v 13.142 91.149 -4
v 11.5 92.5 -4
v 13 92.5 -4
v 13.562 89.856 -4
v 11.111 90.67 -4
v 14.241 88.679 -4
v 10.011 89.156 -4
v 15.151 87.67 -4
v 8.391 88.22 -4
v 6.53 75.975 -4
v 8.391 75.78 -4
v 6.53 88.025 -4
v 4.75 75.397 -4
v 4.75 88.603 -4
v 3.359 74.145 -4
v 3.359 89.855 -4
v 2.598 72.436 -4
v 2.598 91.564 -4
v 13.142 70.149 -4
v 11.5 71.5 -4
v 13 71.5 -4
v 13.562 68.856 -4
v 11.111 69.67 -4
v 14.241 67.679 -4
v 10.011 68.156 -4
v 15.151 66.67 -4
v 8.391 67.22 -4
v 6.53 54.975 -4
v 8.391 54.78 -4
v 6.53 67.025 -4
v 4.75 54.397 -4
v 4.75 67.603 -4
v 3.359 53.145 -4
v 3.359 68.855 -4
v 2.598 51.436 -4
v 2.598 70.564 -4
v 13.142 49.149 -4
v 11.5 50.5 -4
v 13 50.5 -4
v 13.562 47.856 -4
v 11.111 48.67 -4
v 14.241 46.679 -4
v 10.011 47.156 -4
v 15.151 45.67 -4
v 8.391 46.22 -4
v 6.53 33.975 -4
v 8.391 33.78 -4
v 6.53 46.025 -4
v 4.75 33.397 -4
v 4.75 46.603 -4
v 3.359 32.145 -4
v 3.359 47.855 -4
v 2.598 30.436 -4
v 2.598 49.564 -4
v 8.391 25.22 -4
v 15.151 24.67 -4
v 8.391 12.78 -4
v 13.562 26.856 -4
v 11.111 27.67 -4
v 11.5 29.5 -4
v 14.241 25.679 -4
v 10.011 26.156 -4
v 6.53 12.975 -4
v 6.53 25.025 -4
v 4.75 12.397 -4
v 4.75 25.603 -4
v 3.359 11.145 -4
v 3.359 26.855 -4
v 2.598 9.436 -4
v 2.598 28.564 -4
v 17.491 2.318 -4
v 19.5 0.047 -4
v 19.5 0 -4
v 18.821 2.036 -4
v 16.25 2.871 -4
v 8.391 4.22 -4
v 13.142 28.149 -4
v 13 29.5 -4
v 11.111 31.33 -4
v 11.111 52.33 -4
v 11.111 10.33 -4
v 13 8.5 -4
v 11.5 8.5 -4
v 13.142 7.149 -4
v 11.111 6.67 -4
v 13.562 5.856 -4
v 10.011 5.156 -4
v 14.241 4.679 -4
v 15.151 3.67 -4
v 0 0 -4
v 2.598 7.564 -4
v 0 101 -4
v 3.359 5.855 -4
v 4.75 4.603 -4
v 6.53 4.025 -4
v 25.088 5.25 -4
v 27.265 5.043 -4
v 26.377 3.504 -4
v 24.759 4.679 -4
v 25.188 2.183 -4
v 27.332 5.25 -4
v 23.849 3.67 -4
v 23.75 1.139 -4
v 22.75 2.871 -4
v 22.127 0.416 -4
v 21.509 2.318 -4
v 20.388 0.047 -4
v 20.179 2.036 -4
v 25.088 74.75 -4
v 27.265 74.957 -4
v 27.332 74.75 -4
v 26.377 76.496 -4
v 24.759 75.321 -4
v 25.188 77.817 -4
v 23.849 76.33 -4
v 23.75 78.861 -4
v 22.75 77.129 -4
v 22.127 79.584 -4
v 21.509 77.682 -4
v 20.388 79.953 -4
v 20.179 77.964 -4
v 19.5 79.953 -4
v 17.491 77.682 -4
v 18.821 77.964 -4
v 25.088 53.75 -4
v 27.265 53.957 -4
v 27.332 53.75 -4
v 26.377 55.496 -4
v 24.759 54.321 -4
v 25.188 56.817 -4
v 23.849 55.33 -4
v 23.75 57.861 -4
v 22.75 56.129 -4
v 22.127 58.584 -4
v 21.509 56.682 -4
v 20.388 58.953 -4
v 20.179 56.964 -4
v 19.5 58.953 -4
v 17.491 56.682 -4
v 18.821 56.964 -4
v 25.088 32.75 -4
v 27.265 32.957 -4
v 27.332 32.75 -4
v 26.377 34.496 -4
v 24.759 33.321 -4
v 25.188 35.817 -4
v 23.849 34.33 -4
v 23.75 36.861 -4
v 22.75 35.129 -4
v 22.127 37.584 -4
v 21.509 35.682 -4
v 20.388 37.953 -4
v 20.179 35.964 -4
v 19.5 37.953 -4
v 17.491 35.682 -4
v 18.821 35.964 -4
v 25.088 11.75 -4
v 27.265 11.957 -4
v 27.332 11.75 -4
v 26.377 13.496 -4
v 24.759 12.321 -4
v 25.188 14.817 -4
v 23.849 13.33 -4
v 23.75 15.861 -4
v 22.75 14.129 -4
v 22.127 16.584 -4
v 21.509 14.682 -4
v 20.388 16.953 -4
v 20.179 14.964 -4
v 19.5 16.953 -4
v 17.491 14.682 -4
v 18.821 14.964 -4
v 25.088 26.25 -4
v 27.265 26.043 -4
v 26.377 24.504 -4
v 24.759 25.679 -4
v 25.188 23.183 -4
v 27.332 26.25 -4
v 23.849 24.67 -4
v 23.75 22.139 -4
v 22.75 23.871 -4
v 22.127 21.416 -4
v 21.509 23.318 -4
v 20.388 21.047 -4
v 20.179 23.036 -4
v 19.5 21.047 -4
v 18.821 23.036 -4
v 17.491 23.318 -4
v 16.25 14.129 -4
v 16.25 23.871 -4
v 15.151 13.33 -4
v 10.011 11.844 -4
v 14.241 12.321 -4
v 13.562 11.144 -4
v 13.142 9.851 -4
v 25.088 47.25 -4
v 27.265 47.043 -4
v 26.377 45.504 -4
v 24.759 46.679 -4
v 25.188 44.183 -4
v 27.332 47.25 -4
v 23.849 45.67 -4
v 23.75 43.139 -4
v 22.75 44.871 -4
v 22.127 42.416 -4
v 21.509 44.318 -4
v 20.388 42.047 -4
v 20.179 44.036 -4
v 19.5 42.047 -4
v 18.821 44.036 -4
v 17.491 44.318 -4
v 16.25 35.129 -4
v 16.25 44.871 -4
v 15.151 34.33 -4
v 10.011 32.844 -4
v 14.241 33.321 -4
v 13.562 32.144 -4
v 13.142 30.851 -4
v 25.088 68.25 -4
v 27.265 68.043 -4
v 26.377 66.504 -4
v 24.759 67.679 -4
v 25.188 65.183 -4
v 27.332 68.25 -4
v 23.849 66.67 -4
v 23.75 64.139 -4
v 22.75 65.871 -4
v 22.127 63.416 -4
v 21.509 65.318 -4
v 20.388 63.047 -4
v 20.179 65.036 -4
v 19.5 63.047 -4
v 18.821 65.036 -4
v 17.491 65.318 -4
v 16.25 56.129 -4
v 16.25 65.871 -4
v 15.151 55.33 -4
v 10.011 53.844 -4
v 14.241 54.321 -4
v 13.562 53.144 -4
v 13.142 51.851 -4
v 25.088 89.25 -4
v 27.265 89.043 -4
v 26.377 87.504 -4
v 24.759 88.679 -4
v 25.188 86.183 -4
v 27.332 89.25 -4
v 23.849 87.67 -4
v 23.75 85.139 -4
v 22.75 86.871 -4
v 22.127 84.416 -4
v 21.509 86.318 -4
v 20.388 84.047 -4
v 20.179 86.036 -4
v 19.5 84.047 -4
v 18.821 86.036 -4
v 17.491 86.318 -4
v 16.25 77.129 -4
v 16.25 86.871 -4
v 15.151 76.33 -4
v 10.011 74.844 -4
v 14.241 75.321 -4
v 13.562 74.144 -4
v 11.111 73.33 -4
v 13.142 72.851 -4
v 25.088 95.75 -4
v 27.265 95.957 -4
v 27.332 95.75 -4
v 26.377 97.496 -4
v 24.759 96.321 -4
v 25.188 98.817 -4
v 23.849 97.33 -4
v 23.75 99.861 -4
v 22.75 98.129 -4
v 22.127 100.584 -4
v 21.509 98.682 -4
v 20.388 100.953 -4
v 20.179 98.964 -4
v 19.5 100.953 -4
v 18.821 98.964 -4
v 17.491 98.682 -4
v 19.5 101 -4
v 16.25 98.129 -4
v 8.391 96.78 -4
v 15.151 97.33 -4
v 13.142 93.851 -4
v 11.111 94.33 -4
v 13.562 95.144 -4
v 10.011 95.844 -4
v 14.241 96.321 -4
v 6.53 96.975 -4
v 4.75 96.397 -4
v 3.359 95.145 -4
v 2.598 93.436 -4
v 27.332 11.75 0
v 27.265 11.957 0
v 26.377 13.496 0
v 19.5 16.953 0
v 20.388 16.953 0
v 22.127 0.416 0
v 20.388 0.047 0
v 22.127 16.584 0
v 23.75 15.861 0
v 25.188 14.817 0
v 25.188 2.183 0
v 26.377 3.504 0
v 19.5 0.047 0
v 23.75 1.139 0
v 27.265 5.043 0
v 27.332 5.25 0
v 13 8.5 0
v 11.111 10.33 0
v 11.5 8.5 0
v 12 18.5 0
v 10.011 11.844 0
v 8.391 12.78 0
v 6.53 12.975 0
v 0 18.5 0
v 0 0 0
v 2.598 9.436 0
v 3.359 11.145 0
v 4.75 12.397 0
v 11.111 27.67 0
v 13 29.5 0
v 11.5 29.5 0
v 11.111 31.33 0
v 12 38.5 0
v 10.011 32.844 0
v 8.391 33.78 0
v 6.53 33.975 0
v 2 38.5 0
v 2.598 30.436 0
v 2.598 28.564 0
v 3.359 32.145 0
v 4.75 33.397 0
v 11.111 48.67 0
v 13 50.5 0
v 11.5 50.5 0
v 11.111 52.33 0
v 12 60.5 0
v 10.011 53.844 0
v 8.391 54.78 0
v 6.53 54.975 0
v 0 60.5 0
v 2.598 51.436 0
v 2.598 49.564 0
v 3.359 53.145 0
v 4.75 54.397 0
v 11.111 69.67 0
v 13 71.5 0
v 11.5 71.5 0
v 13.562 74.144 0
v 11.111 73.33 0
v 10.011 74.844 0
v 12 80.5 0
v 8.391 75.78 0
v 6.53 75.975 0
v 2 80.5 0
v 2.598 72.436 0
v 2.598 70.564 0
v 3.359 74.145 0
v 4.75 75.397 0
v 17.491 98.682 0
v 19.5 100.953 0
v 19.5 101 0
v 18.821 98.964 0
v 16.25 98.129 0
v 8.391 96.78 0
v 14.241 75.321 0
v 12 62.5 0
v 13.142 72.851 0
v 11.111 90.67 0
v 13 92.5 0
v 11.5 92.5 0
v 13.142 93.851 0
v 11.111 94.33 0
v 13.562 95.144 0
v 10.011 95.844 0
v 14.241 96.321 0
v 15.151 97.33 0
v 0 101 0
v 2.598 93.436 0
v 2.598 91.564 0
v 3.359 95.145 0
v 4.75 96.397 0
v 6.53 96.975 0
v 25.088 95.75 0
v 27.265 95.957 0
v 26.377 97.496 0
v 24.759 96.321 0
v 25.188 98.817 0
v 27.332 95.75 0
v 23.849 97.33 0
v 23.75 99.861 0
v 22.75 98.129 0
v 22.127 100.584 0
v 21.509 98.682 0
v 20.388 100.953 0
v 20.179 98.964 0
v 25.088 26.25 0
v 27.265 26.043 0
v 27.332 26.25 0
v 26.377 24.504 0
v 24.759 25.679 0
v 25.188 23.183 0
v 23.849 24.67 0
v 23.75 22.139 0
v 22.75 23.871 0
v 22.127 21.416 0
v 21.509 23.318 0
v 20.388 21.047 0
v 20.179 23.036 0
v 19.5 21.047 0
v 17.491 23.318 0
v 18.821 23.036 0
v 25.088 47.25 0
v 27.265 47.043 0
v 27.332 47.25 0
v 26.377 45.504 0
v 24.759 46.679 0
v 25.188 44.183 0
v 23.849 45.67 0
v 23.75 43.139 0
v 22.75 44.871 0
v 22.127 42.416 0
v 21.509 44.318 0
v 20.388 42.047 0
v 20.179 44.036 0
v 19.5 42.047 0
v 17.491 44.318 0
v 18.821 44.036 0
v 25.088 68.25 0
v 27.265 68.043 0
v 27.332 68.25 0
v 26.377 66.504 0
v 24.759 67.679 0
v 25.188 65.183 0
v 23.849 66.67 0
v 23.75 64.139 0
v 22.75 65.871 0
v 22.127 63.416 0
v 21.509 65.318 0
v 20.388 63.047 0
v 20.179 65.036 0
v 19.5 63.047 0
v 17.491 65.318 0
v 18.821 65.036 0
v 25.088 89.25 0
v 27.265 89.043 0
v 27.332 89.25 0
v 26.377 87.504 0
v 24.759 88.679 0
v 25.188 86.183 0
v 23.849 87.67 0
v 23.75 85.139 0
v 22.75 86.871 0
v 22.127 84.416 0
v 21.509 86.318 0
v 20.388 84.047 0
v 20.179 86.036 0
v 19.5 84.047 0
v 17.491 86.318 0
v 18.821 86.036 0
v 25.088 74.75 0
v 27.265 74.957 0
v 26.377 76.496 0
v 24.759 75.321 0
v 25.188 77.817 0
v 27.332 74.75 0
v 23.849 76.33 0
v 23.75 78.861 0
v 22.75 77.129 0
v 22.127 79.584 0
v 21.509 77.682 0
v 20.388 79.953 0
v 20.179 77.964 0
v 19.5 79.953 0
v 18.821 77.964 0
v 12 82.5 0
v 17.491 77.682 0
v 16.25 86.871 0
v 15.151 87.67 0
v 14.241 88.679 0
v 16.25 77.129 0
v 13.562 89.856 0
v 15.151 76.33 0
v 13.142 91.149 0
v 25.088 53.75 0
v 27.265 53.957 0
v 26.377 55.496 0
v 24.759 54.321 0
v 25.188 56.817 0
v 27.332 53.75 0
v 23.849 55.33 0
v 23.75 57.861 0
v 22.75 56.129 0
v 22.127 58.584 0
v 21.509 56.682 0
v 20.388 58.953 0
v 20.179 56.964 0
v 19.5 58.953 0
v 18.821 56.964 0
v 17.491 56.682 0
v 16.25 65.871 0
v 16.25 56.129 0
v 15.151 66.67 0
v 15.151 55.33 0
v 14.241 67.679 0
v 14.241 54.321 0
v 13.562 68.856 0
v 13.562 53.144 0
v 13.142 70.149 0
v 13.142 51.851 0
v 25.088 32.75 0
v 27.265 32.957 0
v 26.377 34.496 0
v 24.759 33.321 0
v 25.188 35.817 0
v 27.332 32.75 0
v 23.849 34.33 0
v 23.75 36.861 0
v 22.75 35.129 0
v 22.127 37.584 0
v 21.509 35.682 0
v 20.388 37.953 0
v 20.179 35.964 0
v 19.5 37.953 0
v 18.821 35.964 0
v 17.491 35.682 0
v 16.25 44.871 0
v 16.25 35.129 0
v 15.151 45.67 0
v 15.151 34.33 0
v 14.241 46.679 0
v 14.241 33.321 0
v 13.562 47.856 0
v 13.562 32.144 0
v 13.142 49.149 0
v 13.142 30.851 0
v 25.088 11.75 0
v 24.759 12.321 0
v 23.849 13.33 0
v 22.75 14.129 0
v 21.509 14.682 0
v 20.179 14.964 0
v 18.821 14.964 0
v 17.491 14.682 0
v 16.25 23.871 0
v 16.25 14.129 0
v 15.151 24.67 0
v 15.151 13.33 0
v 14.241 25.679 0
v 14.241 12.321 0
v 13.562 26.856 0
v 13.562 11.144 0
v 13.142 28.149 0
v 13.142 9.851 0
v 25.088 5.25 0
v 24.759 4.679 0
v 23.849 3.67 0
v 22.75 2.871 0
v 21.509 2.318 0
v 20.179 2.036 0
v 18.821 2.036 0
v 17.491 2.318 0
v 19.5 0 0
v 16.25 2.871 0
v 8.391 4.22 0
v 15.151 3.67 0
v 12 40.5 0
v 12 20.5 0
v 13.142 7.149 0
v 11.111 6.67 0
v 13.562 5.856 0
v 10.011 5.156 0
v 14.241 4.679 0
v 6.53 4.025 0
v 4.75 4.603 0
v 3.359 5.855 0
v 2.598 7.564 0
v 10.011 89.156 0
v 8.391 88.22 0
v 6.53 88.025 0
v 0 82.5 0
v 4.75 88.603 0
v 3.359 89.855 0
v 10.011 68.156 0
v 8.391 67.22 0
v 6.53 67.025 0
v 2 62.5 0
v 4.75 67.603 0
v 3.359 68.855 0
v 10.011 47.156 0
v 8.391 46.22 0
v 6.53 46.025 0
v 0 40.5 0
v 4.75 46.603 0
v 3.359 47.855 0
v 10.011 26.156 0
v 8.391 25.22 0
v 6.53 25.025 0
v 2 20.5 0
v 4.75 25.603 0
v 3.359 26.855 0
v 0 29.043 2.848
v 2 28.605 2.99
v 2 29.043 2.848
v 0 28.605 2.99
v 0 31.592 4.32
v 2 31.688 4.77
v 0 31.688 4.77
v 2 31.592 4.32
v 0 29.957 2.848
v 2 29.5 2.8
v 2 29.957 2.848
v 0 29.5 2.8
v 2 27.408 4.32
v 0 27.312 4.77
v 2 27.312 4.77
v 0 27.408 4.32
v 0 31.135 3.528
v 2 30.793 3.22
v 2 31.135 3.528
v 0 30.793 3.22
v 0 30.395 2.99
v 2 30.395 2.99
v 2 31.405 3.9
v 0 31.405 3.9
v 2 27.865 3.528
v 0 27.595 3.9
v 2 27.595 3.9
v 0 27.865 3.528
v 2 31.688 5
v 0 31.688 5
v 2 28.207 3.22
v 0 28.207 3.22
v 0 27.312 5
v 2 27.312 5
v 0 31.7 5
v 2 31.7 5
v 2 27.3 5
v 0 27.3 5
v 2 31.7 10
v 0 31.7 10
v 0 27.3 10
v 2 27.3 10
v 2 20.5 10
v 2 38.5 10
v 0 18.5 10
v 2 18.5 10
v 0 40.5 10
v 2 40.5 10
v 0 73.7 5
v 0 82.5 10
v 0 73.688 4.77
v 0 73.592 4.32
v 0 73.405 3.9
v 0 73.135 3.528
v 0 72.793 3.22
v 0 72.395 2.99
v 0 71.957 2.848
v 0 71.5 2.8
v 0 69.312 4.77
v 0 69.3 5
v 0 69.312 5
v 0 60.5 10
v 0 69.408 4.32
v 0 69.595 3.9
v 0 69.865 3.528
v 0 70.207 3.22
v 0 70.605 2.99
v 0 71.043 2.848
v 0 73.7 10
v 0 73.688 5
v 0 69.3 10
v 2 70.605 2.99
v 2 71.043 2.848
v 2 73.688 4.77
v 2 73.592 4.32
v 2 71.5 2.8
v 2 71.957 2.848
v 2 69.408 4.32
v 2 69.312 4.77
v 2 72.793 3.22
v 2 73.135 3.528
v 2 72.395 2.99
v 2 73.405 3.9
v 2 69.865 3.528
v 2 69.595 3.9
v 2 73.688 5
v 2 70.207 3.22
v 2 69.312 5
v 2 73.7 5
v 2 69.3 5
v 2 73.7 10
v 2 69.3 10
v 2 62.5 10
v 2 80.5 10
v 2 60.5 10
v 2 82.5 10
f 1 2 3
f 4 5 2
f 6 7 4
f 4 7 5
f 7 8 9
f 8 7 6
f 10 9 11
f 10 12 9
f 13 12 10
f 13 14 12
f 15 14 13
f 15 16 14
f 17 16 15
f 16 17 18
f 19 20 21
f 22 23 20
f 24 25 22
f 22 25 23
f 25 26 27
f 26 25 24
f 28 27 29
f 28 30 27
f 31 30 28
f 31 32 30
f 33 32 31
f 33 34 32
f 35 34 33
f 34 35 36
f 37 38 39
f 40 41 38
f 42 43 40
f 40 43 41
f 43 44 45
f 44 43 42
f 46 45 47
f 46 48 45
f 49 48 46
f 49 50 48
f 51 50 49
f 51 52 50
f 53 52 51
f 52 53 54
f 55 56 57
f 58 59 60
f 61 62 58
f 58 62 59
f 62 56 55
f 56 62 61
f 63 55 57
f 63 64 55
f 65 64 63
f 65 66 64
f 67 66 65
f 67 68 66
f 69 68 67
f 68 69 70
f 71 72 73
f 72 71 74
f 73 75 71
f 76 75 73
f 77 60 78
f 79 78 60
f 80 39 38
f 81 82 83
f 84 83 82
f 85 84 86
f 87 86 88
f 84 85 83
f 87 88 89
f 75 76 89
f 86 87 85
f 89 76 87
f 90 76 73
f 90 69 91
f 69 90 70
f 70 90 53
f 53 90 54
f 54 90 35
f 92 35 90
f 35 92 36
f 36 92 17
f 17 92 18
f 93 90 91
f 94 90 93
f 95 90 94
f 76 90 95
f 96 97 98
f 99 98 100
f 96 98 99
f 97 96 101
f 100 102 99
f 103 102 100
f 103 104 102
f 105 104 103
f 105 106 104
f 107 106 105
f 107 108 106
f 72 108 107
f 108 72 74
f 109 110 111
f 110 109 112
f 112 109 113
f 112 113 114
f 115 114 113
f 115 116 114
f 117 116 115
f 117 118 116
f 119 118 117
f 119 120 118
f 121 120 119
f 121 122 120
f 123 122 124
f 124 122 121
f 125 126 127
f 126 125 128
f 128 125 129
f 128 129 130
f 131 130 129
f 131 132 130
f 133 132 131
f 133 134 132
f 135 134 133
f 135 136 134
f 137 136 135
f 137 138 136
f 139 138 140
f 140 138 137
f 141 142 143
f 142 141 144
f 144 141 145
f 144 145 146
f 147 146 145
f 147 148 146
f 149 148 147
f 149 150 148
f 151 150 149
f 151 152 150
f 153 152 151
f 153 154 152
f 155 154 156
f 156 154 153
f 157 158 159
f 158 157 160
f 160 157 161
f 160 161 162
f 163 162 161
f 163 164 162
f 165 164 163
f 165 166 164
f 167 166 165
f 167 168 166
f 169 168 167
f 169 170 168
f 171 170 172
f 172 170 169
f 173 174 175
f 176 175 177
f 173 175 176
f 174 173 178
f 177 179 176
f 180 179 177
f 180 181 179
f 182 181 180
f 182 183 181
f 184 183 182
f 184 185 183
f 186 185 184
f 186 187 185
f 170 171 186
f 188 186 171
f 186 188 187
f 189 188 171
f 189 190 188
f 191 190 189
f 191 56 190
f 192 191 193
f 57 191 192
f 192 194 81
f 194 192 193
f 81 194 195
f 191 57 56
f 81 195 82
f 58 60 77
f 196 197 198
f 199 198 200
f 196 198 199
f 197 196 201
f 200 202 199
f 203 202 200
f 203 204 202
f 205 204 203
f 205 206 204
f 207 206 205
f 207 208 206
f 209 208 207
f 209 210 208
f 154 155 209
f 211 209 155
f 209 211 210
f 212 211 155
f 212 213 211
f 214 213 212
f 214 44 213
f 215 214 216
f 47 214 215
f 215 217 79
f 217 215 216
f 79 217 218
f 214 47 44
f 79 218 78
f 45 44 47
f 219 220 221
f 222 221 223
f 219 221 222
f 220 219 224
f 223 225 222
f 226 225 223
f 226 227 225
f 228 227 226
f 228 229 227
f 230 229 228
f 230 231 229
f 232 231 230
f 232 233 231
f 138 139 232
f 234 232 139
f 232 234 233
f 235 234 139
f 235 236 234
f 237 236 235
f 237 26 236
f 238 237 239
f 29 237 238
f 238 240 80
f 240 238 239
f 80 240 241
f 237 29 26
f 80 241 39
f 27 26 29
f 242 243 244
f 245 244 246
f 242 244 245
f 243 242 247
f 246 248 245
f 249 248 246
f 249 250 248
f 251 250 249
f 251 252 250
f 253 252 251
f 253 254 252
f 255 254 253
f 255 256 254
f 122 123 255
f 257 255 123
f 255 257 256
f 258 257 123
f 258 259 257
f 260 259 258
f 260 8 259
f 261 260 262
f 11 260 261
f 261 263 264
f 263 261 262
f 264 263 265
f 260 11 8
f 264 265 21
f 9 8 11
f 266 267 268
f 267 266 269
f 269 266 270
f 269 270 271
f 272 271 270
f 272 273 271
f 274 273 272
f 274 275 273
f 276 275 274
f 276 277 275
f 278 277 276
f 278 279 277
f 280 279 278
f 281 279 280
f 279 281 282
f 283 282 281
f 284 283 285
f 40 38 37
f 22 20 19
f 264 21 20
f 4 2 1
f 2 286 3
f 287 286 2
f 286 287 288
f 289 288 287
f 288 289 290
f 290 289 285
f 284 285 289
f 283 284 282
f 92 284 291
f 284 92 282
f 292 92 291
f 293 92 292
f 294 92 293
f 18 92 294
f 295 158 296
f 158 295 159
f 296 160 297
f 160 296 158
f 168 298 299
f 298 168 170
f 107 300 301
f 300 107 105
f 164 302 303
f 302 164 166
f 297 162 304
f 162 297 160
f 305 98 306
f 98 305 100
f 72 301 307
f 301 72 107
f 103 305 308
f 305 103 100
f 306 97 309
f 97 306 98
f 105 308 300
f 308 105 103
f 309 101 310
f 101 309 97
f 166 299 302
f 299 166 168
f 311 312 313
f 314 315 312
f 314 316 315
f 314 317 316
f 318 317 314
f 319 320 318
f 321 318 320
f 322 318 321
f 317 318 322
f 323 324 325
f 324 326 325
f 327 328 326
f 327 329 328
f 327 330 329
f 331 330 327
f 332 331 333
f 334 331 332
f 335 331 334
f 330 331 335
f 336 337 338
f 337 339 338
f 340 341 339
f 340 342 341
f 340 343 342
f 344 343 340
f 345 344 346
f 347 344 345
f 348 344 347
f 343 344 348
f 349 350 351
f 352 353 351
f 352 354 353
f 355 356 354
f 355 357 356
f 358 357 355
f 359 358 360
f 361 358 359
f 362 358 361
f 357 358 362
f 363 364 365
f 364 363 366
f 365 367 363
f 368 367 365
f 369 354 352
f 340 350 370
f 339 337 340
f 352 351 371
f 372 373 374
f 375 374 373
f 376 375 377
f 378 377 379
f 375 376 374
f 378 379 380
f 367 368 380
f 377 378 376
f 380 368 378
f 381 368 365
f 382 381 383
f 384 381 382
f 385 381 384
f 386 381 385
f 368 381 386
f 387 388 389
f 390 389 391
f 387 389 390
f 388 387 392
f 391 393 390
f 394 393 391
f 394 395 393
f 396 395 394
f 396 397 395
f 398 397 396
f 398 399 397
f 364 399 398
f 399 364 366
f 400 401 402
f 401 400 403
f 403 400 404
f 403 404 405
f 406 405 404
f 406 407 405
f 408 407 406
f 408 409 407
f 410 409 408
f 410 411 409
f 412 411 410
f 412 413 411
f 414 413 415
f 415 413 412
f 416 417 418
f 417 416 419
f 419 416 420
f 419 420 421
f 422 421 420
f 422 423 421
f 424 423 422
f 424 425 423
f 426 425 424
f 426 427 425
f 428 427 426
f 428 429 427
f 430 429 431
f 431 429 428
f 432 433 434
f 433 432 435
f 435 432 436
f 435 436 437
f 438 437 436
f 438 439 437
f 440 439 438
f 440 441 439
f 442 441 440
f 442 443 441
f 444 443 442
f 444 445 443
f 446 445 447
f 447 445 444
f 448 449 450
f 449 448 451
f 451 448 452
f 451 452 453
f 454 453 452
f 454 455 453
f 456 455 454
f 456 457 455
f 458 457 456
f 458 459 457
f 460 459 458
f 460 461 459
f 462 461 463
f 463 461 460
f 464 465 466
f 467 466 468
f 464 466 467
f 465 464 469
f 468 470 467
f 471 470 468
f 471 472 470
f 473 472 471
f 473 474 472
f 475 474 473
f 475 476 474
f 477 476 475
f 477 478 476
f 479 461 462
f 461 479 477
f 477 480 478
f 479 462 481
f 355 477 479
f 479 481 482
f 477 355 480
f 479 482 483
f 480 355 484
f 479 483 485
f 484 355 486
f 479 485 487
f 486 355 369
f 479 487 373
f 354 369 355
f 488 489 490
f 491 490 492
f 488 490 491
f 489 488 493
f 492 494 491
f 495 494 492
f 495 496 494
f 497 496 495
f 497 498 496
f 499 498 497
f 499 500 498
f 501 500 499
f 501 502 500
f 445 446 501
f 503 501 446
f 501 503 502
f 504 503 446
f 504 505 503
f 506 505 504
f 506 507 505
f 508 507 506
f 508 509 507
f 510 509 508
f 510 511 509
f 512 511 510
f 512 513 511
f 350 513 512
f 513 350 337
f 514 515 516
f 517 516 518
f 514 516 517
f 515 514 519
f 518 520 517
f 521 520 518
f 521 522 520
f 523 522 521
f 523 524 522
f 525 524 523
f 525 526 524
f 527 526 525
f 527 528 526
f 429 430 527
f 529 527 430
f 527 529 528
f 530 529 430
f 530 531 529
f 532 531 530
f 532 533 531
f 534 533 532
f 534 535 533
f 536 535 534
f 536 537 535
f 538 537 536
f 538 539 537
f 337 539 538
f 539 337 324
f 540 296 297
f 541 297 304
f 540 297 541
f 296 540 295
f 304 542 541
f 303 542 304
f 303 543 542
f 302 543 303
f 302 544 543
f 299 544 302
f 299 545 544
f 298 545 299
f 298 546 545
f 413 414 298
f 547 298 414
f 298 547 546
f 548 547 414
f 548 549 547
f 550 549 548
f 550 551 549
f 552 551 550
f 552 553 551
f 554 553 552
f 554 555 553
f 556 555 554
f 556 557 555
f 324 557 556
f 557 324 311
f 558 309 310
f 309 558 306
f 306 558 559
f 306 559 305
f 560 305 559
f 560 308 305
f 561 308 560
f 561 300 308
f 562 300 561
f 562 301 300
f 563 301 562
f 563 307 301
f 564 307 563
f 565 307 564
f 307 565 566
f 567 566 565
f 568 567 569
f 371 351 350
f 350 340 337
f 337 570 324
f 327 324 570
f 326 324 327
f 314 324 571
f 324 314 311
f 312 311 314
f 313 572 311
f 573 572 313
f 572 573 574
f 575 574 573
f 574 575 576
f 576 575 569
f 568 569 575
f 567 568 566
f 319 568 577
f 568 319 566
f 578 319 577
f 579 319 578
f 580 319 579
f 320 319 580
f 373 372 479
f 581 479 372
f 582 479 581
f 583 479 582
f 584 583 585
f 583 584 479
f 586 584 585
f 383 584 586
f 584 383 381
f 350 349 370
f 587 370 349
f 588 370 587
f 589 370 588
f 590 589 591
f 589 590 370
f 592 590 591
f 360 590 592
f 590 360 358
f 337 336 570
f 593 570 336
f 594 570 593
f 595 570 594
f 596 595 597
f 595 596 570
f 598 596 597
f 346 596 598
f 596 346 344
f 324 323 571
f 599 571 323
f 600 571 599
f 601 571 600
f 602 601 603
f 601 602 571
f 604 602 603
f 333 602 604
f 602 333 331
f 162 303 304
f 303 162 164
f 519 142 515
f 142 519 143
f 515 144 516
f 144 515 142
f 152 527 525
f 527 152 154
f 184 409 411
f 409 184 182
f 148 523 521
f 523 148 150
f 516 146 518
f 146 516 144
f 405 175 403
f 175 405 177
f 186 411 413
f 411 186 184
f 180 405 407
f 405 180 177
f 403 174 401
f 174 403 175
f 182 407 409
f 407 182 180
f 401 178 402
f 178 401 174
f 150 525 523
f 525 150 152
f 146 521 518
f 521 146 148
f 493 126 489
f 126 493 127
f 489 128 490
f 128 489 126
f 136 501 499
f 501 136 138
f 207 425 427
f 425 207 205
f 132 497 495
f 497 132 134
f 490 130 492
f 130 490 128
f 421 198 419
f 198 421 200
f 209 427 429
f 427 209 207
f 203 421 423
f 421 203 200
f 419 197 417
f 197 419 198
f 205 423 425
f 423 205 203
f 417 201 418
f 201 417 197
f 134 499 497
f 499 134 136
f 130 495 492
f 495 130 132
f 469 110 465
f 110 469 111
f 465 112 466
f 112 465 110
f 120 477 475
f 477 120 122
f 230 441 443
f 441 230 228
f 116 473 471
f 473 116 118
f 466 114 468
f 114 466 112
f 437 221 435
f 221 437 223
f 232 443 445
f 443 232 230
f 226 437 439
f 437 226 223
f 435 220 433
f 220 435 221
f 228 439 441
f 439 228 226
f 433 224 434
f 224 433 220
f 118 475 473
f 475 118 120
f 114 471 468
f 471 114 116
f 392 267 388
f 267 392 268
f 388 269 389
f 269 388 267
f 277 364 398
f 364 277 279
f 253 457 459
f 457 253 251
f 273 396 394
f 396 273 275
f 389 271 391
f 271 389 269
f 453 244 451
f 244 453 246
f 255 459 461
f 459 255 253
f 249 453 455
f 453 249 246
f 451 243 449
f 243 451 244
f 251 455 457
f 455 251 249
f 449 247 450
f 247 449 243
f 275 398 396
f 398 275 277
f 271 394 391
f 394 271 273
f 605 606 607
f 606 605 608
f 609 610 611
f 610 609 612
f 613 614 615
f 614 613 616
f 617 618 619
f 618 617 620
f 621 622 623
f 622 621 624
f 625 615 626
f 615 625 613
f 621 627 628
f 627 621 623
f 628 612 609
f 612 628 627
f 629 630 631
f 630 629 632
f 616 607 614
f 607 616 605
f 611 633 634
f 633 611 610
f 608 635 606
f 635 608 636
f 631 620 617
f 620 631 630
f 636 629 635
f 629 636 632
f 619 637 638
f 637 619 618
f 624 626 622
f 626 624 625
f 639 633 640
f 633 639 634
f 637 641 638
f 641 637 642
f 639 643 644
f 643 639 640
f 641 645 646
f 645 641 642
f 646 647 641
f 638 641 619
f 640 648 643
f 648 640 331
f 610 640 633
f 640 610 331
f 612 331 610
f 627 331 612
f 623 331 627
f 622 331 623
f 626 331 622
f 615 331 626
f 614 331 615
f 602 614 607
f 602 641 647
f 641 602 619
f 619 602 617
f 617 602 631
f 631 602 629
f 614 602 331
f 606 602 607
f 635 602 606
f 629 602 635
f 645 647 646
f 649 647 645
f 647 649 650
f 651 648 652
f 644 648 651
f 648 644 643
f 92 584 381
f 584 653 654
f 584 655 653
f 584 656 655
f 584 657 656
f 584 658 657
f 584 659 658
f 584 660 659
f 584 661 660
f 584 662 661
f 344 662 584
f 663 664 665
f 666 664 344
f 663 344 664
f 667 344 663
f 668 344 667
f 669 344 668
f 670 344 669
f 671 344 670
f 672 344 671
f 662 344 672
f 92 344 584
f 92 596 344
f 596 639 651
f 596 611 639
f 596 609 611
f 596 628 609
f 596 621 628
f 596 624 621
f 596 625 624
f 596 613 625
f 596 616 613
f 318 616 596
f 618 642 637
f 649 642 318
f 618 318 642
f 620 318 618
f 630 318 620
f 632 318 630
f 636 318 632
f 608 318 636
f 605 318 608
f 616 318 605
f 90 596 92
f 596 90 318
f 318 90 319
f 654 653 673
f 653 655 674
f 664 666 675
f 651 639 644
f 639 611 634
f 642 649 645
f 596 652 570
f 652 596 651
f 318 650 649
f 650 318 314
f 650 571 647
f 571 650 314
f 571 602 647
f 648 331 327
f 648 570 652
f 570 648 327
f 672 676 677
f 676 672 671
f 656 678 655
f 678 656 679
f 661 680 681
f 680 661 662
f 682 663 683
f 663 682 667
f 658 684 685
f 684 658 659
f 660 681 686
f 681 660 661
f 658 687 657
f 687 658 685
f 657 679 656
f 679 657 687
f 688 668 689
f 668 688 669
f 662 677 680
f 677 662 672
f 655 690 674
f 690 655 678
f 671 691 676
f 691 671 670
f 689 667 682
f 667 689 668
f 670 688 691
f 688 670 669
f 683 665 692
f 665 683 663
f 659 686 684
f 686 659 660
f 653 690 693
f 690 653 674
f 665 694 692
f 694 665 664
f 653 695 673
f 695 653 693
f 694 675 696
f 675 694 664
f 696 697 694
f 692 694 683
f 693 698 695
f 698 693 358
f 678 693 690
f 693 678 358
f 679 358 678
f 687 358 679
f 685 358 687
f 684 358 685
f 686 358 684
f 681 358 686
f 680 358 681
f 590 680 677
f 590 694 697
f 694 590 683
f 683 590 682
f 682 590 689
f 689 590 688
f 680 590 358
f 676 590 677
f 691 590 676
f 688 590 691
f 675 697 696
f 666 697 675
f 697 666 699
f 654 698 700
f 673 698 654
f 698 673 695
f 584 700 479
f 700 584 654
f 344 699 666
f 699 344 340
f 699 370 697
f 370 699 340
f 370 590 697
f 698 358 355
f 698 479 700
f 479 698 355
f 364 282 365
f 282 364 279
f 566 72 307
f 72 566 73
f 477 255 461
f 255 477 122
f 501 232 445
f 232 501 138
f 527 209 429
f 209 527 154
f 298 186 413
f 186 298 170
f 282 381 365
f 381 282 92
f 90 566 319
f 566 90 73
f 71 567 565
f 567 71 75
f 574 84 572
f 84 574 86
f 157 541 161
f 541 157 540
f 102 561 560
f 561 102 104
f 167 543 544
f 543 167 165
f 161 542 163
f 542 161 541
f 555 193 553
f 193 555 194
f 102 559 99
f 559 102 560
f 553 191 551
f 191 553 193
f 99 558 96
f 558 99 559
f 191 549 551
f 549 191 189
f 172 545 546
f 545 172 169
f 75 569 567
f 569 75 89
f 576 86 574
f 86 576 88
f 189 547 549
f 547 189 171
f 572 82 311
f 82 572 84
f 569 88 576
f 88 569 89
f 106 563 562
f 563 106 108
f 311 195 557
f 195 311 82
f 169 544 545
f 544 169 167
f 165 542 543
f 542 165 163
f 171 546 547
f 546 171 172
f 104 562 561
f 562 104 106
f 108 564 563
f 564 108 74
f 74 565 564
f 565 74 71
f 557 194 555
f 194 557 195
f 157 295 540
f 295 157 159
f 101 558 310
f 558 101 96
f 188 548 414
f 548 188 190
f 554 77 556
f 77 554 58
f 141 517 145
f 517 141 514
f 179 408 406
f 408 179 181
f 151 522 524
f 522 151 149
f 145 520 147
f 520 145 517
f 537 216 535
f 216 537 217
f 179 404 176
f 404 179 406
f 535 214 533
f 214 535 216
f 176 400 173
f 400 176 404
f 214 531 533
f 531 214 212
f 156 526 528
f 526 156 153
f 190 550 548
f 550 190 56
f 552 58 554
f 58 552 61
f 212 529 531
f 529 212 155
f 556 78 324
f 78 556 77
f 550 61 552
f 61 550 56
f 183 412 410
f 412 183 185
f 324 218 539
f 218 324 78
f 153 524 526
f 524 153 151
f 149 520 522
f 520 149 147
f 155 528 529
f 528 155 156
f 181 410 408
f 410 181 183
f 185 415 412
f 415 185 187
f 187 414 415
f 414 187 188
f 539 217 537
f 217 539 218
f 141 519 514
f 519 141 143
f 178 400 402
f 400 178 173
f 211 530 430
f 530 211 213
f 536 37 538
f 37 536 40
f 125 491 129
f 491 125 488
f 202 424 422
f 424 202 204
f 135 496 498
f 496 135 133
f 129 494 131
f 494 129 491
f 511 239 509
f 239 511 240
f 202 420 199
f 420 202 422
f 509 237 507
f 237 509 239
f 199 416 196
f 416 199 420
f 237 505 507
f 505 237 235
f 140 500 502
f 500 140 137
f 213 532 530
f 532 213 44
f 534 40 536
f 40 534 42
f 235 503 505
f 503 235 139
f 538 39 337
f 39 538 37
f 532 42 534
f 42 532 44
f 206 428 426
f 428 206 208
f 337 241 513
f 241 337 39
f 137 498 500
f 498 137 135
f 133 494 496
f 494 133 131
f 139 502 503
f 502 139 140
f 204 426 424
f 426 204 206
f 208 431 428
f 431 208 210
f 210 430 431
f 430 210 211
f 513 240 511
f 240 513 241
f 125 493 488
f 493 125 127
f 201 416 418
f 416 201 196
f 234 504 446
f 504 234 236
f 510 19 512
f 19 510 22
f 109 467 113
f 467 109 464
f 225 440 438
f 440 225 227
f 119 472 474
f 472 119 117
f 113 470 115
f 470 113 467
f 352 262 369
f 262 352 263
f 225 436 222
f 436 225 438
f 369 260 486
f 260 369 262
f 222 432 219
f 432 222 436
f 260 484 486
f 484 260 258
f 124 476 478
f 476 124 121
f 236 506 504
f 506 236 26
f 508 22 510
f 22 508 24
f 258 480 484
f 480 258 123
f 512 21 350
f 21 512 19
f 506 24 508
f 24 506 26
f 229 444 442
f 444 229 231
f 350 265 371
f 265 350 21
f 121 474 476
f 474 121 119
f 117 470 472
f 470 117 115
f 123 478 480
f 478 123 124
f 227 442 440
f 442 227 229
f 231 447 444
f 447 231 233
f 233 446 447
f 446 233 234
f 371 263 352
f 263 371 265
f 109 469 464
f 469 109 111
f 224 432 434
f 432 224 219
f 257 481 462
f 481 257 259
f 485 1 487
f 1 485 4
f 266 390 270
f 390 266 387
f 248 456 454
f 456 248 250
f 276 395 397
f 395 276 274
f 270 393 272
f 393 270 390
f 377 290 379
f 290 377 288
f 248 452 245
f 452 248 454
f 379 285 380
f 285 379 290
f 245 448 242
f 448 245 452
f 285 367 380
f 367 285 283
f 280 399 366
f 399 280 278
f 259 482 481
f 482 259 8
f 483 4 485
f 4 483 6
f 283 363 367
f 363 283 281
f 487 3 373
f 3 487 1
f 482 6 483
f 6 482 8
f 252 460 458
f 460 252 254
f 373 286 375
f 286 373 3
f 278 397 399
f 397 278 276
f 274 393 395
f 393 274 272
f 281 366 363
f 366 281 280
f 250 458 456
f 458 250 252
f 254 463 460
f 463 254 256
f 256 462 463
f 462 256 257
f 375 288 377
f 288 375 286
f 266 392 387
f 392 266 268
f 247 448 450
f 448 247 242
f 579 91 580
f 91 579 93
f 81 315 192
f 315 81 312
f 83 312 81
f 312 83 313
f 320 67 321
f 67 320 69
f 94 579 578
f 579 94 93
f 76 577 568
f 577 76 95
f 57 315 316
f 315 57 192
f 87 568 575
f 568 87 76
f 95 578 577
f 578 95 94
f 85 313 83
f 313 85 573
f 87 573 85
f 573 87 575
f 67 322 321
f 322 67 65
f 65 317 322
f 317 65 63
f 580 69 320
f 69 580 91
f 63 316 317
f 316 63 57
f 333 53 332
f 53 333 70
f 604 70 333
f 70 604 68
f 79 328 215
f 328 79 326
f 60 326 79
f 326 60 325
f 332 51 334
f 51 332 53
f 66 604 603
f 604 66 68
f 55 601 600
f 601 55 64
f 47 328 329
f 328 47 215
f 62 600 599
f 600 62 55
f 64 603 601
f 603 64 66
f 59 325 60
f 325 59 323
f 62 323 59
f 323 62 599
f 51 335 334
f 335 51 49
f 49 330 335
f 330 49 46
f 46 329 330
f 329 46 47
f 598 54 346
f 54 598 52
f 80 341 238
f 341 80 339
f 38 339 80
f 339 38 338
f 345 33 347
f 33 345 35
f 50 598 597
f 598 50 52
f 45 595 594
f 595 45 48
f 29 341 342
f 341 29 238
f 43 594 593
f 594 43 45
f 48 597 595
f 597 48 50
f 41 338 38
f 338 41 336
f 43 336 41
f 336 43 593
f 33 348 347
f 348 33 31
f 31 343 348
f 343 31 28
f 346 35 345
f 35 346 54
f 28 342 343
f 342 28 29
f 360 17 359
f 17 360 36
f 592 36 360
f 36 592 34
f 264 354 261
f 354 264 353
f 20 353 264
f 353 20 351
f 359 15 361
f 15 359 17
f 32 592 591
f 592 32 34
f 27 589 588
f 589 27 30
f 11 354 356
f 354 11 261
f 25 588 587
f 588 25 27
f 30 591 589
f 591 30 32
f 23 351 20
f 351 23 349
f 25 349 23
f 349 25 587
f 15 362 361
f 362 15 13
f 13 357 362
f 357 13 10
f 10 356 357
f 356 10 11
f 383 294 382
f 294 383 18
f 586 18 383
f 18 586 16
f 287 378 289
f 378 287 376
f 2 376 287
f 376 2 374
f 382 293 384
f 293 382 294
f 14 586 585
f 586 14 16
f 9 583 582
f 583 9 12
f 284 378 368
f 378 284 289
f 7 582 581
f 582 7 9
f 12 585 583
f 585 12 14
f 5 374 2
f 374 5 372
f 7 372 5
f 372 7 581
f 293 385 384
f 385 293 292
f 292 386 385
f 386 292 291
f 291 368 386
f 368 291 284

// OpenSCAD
// Parametric USB Cable Organizer - GuyC

// note that with default replicatorG 1-extra-shell, 10% infill
// options the fingers formed by these rings will get a shell
// but no infill, so you can see through them.  I'm happy with
// that, but you may not be.

// Dimensions for the ring

ringInnerRadius = 6.5;     // radius of hole
ringThickness   = 2.0;     // wall thickness of rings
ringPadding     = 4.0;     // extra spacing between rings
ringNotch       = 6.5;     // notch wide enough to let cable pass through
ringOuterRadius = ringInnerRadius + ringThickness;

// recess for the DB9 screw shafts on many connectors
recessOffset    = 12.5;    // DB9 has 25mm between screw holes
recessRadius    =  4.5;    

// Dimensions for the buttressed wall-attachment brackets

bracketHeight      = 10.0;  
bracketWall        =  2.0;  // thickness of back wall and buttresses
bracketBaseOffset  = 10.0;  // offset of base of buttress
bracketSlotWidth   =  4.4;  // wide enough for shaft of screw
bracketSlotDepth   =  5.0;  // suggest bracketHeight/2
bracketWidth       = 2*ringOuterRadius+ringPadding+bracketWall/2;

ringOutset         = 11;  // back wall to back edge of hole

// Overall platform size is determined by the depth and number of rings

platformDepth      =  4.0;  // thickness of platform
noRings            =  5;    // number of rings


function ringOrigin(i) = [ringOutset+ringOuterRadius,ringOuterRadius+(ringOuterRadius*2+ringPadding)*i,-platformDepth];

// support()
// Triangular buttress for supporting bracket.

module support()
{
    polyhedron (
	    points = [
 			[0, 0, bracketHeight],
           [0, bracketWall, bracketHeight], 
           [0, bracketWall, 0], 
           [0, 0, 0],
           [bracketBaseOffset, 0, 0],
           [bracketBaseOffset, bracketWall, 0]
        ],
        triangles = [[0,3,2],
                     [0,2,1],
                     [3,0,4],
                     [1,2,5], 
                     [0,5,4],
                     [0,1,5],
                     [5,2,4],
                     [4,2,3],
     ]);
}

// bracket(i)
// Bracket with buttresses and screw slot positioned
// so that it is aligned with the ith ring.  i MUST
// be >=0 and < noRings, but will overhang the platform
// slightly in the first and last positions, so I recommend
// i=1 and i=noRings-2.

// note that the negative geometries for the screw hole extend
// 1mm either side of the bracket to avoid co-incident faces.

module bracket(i)
{

	y = ringOrigin(i)[1];
    translate([0,y,0]) {
  	  difference() {
		// back wall
		translate([0, -bracketWidth/2,0]) 
			cube(size=[bracketWall, bracketWidth, bracketHeight], center=false);
		union() {
			// hole for slot
			translate([-1,0,bracketHeight-bracketSlotDepth]) 
			{
				rotate([0,90,0]) 
	       			cylinder(h=bracketWall+2,r=bracketSlotWidth/2,$fs=0.1);
			}
			// slot
			translate([-1,-bracketSlotWidth/2,bracketHeight-bracketSlotDepth+0])
				cube(size=[bracketWall+2, bracketSlotWidth, bracketSlotDepth+1], center=false);
		}
	  }

  	  // left support
     translate([bracketWall,-bracketWidth/2,0])
		support();
	 // right support
     translate([bracketWall,bracketWidth/2-bracketWall,0])
		support();
	}
}

// platform()
// The rectangular body of the platform.

module platform()
{
	translate([0,0,-platformDepth])
		cube(size=[ringOutset+ringOuterRadius, noRings*2*ringOuterRadius+(noRings-1)*ringPadding, platformDepth]);
}

// ringPositive(i)
// The positive geometry of the ith ring which will be added to the platform()

module ringPositive(i)
{	translate(ringOrigin(i))
		cylinder(h=platformDepth, r=ringOuterRadius, $fs=0.1);
}

// ringNegative(i)
// The negative geometry of the ith ring which will be subtracted from the platform()
// Note that we arbitrarily extend this 2mm above and below the positive geometry
// to ensure that we do not have co-incident faces.

module ringNegative(i)
{
	translate(ringOrigin(i)) {
		translate([0,0,-1]) {
			union() {
				cylinder(h=platformDepth+2, r=ringInnerRadius, $fs=0.1);
				translate([ringOuterRadius/2,0,platformDepth/2+1])
					cube(size=[ringOuterRadius+1,ringNotch,platformDepth+2], center=true);
			}
		}
	}
}

module recess(i)
{
    translate(ringOrigin(i)) {
      translate([-recessOffset,0,-bracketHeight-1]) {
        cylinder(h=platformDepth+bracketHeight*2+2, r=recessRadius);
      }
    }
}


// FINAL GEOMETRY
// We construct the platform and the positive ring geometry, then
// remove the negative ring geometry.

difference() {
	union() {
		platform();
		for(i = [0 : noRings-1]) {
			ringPositive(i);
		}
		// brackets at 2nd and 2nd last position
    	bracket(1);
		if (noRings>3) bracket(noRings-2);
	}
	union() {
		for(i = [0 : noRings-1]) {
			ringNegative(i);
 			recess(i);
		}
	}
}
